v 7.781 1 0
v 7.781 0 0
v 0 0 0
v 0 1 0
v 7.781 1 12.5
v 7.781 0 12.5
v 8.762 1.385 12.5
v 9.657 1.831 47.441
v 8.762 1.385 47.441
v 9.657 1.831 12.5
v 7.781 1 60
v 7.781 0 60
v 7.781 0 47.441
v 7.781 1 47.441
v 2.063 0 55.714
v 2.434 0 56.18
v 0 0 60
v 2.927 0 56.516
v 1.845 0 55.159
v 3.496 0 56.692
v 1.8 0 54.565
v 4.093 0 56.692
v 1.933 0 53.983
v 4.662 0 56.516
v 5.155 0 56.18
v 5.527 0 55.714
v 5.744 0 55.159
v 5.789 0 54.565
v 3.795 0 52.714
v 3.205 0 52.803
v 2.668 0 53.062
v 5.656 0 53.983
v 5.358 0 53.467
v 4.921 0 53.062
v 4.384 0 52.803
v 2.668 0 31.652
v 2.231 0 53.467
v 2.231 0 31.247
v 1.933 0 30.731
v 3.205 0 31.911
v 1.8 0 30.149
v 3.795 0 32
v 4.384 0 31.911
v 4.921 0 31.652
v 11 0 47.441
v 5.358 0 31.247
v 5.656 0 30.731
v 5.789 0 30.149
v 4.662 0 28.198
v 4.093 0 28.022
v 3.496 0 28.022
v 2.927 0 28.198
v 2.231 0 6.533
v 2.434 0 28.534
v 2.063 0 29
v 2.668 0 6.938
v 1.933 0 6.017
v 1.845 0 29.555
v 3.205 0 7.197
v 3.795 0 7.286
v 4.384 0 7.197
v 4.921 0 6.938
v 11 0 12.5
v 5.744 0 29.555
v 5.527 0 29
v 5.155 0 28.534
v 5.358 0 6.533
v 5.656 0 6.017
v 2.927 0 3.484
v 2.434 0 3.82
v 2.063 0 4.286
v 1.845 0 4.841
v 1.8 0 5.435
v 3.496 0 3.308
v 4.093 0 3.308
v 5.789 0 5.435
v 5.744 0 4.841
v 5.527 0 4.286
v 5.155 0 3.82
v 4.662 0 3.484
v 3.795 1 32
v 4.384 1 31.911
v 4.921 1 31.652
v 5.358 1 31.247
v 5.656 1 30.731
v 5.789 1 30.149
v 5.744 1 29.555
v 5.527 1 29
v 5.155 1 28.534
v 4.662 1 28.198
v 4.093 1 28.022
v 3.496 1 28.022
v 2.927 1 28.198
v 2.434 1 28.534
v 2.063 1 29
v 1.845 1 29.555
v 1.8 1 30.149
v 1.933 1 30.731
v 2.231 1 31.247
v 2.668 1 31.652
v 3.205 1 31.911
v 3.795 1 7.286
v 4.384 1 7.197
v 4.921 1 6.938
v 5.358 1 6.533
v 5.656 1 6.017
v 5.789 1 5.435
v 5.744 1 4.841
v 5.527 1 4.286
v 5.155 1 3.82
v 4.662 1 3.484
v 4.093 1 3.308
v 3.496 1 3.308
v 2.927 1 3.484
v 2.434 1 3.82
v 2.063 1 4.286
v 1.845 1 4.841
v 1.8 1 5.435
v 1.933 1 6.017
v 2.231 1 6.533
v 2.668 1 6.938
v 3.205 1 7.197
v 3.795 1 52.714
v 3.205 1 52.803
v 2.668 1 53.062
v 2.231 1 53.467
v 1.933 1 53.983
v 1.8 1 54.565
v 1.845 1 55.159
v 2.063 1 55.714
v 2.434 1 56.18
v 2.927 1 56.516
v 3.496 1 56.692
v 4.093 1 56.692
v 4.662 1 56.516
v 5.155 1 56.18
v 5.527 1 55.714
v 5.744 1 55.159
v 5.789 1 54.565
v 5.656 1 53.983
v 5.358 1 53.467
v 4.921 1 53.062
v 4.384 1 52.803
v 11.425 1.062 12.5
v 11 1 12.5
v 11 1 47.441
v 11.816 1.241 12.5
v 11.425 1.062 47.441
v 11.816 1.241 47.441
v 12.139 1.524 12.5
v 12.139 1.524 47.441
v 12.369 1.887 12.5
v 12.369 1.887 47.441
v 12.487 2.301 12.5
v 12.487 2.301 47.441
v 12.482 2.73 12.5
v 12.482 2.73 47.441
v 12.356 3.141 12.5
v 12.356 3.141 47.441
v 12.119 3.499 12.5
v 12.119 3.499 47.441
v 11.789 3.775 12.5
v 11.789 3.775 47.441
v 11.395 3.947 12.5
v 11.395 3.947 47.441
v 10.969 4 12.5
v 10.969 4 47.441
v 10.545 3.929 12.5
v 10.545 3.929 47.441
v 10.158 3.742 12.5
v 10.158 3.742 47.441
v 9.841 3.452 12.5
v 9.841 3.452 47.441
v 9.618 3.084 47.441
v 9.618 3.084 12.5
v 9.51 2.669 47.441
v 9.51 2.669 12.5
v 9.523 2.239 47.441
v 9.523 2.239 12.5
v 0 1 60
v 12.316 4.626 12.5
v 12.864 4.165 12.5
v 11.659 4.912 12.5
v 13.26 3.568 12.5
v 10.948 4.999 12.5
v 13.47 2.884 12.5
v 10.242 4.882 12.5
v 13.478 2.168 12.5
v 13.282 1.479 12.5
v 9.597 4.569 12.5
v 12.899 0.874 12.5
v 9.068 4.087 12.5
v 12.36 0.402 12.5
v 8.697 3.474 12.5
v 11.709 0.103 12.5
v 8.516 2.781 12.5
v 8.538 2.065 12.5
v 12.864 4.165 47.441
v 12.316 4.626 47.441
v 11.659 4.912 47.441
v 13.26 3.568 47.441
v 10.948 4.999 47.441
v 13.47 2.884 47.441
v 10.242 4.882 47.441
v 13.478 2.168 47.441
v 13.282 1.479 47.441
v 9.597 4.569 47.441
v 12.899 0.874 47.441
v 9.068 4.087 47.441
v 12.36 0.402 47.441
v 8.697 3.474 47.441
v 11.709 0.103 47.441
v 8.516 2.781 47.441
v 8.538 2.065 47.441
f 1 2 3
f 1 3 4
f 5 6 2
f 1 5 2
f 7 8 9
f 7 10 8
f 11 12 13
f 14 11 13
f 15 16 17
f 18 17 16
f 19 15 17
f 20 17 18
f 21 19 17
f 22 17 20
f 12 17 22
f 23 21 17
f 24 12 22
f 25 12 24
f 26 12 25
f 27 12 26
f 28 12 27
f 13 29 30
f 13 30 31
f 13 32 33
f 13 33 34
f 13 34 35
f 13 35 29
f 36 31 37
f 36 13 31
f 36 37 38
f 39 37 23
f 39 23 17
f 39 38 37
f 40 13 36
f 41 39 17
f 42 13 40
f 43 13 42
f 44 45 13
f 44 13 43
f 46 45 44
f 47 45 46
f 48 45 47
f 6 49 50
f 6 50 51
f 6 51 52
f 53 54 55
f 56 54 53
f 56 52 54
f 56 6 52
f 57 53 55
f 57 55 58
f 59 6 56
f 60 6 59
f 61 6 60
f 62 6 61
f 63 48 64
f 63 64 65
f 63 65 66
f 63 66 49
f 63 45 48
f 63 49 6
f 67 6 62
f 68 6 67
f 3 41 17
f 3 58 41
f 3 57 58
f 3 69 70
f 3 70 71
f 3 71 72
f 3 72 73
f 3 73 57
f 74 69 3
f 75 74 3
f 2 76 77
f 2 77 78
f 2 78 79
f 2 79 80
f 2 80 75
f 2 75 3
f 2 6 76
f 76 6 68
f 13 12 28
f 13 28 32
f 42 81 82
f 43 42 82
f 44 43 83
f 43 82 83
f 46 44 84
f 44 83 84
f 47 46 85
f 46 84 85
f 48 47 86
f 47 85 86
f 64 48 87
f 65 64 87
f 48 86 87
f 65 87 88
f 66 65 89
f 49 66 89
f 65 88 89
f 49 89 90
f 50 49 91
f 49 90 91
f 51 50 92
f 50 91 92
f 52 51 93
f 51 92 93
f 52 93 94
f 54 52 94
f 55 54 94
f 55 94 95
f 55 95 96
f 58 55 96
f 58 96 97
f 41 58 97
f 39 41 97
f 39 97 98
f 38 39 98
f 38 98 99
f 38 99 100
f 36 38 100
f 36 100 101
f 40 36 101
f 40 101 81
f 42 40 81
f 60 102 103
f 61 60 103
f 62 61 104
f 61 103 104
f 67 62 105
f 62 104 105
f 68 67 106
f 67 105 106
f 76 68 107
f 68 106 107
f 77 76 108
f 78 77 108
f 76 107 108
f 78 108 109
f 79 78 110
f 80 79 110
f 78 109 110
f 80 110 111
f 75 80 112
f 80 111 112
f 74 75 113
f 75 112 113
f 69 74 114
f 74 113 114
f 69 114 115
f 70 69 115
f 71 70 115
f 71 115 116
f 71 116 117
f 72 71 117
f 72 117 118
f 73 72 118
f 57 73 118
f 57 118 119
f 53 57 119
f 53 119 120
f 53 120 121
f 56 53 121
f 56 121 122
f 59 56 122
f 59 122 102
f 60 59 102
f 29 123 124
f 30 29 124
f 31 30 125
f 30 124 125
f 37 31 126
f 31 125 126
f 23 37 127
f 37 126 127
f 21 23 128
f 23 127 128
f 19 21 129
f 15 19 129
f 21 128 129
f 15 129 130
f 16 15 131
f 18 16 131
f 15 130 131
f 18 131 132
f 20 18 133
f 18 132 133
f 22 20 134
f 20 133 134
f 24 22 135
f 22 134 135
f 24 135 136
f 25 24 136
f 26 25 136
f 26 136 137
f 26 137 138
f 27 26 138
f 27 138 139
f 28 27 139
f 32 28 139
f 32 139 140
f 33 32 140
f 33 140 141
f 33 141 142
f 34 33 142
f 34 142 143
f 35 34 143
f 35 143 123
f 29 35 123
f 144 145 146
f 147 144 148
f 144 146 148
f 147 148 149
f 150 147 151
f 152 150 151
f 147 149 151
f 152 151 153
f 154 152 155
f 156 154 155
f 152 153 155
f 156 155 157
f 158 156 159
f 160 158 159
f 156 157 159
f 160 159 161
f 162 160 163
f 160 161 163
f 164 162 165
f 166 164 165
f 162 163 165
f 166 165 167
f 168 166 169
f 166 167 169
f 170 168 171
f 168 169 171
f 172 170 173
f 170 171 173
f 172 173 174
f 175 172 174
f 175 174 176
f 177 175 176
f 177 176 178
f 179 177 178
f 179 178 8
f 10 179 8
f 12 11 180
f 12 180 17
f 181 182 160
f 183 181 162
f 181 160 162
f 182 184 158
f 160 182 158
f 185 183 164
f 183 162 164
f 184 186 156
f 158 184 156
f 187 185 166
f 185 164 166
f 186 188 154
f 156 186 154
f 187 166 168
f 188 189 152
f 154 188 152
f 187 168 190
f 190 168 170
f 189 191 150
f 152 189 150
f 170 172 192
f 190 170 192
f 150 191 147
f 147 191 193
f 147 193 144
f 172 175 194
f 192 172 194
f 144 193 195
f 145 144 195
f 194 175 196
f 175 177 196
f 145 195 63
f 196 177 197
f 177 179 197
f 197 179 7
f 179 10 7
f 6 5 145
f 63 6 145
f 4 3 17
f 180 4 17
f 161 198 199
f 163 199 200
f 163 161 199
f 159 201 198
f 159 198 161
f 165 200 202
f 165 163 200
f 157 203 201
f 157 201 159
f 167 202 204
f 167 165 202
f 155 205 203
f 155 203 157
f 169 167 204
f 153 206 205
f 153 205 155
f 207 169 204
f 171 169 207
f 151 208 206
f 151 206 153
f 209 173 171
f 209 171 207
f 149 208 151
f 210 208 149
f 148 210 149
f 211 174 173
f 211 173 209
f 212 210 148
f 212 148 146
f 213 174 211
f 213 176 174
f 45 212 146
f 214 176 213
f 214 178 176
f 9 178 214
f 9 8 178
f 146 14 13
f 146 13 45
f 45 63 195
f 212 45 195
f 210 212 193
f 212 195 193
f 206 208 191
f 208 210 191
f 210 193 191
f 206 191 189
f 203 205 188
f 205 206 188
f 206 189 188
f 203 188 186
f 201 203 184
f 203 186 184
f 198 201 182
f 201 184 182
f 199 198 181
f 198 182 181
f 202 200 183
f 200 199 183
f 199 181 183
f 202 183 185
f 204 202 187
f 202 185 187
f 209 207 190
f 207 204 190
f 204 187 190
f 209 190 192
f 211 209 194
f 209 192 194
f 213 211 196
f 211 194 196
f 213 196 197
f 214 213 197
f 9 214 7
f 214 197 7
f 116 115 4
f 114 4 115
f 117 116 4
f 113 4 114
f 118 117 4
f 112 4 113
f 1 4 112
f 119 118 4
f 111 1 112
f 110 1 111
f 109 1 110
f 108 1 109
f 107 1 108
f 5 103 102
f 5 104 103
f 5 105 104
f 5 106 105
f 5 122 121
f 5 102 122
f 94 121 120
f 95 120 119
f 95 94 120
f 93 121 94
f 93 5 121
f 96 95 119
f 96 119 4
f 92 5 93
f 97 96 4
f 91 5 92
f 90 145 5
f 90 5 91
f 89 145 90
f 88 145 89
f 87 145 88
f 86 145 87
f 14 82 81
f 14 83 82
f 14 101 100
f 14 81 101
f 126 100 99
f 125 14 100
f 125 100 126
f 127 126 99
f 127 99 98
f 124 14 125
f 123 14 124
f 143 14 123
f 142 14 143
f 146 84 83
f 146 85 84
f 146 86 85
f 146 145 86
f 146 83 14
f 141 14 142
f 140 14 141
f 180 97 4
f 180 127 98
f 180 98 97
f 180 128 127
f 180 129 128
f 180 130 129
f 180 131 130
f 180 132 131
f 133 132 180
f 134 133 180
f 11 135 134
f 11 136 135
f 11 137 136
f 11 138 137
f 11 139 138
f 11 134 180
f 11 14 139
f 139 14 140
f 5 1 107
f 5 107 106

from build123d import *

# Parameters (mm, degrees)
SKETCH3_W          = 60
SKETCH3_H          = 1
SKETCH4_W          = 8.09810269
SKETCH4_H          = 14.216859333
SKETCH4_W_2        = 8.260259714
SKETCH4_H_2        = 13.467623065
CUT_EXTRUDE1_DEPTH = 62.702917273
SKETCH5_R          = 2
CUT_EXTRUDE2_DEPTH = 62.629944021


with BuildPart() as part:
    # Sweep1: sweep along a path in Sketch1
    with BuildLine(Plane.XY) as sweep1_path:
        Line((0, 0), (11, 0))
        ThreePointArc((11, 0), (12.315747679, 4.62574882), (8.762440739, 1.384953564))
    # Sketch3 → Sweep1 (sweep)
    with BuildSketch(Plane(origin=(0, 0, 0), x_dir=(0, 0, -1), z_dir=(1, 0, 0))):
        with Locations((-30, 0.5)):
            Rectangle(SKETCH3_W, SKETCH3_H)
    sweep(path=sweep1_path.line)

    # Sketch4 → Cut-Extrude1 (cut, through all)
    with BuildSketch(Plane(origin=(0, 0, 0), x_dir=(-1, 0, 0), z_dir=(0, -1, 0))):
        with Locations((-11.830088217, -54.549659974)):
            Rectangle(SKETCH4_W, SKETCH4_H)
        with Locations((-11.911166729, -5.766188468)):
            Rectangle(SKETCH4_W_2, SKETCH4_H_2)
    extrude(amount=-CUT_EXTRUDE1_DEPTH, mode=Mode.SUBTRACT)

    # Sketch5 → Cut-Extrude2 (cut, through all)
    with BuildSketch(Plane(origin=(0, 1, 0), x_dir=(1, 0, 0), z_dir=(0, 1, 0))):
        with Locations(Location((3.794583691, -5.285866517, 0), (0, 0, 270))):
            Circle(SKETCH5_R)
        with Locations(Location((3.794583691, -54.714133483, 0), (0, 0, 90))):
            Circle(SKETCH5_R)
        with Locations(Location((3.794583691, -30, 0), (0, 0, 270))):
            Circle(SKETCH5_R)
    extrude(amount=-CUT_EXTRUDE2_DEPTH, mode=Mode.SUBTRACT)


solid = part.part
